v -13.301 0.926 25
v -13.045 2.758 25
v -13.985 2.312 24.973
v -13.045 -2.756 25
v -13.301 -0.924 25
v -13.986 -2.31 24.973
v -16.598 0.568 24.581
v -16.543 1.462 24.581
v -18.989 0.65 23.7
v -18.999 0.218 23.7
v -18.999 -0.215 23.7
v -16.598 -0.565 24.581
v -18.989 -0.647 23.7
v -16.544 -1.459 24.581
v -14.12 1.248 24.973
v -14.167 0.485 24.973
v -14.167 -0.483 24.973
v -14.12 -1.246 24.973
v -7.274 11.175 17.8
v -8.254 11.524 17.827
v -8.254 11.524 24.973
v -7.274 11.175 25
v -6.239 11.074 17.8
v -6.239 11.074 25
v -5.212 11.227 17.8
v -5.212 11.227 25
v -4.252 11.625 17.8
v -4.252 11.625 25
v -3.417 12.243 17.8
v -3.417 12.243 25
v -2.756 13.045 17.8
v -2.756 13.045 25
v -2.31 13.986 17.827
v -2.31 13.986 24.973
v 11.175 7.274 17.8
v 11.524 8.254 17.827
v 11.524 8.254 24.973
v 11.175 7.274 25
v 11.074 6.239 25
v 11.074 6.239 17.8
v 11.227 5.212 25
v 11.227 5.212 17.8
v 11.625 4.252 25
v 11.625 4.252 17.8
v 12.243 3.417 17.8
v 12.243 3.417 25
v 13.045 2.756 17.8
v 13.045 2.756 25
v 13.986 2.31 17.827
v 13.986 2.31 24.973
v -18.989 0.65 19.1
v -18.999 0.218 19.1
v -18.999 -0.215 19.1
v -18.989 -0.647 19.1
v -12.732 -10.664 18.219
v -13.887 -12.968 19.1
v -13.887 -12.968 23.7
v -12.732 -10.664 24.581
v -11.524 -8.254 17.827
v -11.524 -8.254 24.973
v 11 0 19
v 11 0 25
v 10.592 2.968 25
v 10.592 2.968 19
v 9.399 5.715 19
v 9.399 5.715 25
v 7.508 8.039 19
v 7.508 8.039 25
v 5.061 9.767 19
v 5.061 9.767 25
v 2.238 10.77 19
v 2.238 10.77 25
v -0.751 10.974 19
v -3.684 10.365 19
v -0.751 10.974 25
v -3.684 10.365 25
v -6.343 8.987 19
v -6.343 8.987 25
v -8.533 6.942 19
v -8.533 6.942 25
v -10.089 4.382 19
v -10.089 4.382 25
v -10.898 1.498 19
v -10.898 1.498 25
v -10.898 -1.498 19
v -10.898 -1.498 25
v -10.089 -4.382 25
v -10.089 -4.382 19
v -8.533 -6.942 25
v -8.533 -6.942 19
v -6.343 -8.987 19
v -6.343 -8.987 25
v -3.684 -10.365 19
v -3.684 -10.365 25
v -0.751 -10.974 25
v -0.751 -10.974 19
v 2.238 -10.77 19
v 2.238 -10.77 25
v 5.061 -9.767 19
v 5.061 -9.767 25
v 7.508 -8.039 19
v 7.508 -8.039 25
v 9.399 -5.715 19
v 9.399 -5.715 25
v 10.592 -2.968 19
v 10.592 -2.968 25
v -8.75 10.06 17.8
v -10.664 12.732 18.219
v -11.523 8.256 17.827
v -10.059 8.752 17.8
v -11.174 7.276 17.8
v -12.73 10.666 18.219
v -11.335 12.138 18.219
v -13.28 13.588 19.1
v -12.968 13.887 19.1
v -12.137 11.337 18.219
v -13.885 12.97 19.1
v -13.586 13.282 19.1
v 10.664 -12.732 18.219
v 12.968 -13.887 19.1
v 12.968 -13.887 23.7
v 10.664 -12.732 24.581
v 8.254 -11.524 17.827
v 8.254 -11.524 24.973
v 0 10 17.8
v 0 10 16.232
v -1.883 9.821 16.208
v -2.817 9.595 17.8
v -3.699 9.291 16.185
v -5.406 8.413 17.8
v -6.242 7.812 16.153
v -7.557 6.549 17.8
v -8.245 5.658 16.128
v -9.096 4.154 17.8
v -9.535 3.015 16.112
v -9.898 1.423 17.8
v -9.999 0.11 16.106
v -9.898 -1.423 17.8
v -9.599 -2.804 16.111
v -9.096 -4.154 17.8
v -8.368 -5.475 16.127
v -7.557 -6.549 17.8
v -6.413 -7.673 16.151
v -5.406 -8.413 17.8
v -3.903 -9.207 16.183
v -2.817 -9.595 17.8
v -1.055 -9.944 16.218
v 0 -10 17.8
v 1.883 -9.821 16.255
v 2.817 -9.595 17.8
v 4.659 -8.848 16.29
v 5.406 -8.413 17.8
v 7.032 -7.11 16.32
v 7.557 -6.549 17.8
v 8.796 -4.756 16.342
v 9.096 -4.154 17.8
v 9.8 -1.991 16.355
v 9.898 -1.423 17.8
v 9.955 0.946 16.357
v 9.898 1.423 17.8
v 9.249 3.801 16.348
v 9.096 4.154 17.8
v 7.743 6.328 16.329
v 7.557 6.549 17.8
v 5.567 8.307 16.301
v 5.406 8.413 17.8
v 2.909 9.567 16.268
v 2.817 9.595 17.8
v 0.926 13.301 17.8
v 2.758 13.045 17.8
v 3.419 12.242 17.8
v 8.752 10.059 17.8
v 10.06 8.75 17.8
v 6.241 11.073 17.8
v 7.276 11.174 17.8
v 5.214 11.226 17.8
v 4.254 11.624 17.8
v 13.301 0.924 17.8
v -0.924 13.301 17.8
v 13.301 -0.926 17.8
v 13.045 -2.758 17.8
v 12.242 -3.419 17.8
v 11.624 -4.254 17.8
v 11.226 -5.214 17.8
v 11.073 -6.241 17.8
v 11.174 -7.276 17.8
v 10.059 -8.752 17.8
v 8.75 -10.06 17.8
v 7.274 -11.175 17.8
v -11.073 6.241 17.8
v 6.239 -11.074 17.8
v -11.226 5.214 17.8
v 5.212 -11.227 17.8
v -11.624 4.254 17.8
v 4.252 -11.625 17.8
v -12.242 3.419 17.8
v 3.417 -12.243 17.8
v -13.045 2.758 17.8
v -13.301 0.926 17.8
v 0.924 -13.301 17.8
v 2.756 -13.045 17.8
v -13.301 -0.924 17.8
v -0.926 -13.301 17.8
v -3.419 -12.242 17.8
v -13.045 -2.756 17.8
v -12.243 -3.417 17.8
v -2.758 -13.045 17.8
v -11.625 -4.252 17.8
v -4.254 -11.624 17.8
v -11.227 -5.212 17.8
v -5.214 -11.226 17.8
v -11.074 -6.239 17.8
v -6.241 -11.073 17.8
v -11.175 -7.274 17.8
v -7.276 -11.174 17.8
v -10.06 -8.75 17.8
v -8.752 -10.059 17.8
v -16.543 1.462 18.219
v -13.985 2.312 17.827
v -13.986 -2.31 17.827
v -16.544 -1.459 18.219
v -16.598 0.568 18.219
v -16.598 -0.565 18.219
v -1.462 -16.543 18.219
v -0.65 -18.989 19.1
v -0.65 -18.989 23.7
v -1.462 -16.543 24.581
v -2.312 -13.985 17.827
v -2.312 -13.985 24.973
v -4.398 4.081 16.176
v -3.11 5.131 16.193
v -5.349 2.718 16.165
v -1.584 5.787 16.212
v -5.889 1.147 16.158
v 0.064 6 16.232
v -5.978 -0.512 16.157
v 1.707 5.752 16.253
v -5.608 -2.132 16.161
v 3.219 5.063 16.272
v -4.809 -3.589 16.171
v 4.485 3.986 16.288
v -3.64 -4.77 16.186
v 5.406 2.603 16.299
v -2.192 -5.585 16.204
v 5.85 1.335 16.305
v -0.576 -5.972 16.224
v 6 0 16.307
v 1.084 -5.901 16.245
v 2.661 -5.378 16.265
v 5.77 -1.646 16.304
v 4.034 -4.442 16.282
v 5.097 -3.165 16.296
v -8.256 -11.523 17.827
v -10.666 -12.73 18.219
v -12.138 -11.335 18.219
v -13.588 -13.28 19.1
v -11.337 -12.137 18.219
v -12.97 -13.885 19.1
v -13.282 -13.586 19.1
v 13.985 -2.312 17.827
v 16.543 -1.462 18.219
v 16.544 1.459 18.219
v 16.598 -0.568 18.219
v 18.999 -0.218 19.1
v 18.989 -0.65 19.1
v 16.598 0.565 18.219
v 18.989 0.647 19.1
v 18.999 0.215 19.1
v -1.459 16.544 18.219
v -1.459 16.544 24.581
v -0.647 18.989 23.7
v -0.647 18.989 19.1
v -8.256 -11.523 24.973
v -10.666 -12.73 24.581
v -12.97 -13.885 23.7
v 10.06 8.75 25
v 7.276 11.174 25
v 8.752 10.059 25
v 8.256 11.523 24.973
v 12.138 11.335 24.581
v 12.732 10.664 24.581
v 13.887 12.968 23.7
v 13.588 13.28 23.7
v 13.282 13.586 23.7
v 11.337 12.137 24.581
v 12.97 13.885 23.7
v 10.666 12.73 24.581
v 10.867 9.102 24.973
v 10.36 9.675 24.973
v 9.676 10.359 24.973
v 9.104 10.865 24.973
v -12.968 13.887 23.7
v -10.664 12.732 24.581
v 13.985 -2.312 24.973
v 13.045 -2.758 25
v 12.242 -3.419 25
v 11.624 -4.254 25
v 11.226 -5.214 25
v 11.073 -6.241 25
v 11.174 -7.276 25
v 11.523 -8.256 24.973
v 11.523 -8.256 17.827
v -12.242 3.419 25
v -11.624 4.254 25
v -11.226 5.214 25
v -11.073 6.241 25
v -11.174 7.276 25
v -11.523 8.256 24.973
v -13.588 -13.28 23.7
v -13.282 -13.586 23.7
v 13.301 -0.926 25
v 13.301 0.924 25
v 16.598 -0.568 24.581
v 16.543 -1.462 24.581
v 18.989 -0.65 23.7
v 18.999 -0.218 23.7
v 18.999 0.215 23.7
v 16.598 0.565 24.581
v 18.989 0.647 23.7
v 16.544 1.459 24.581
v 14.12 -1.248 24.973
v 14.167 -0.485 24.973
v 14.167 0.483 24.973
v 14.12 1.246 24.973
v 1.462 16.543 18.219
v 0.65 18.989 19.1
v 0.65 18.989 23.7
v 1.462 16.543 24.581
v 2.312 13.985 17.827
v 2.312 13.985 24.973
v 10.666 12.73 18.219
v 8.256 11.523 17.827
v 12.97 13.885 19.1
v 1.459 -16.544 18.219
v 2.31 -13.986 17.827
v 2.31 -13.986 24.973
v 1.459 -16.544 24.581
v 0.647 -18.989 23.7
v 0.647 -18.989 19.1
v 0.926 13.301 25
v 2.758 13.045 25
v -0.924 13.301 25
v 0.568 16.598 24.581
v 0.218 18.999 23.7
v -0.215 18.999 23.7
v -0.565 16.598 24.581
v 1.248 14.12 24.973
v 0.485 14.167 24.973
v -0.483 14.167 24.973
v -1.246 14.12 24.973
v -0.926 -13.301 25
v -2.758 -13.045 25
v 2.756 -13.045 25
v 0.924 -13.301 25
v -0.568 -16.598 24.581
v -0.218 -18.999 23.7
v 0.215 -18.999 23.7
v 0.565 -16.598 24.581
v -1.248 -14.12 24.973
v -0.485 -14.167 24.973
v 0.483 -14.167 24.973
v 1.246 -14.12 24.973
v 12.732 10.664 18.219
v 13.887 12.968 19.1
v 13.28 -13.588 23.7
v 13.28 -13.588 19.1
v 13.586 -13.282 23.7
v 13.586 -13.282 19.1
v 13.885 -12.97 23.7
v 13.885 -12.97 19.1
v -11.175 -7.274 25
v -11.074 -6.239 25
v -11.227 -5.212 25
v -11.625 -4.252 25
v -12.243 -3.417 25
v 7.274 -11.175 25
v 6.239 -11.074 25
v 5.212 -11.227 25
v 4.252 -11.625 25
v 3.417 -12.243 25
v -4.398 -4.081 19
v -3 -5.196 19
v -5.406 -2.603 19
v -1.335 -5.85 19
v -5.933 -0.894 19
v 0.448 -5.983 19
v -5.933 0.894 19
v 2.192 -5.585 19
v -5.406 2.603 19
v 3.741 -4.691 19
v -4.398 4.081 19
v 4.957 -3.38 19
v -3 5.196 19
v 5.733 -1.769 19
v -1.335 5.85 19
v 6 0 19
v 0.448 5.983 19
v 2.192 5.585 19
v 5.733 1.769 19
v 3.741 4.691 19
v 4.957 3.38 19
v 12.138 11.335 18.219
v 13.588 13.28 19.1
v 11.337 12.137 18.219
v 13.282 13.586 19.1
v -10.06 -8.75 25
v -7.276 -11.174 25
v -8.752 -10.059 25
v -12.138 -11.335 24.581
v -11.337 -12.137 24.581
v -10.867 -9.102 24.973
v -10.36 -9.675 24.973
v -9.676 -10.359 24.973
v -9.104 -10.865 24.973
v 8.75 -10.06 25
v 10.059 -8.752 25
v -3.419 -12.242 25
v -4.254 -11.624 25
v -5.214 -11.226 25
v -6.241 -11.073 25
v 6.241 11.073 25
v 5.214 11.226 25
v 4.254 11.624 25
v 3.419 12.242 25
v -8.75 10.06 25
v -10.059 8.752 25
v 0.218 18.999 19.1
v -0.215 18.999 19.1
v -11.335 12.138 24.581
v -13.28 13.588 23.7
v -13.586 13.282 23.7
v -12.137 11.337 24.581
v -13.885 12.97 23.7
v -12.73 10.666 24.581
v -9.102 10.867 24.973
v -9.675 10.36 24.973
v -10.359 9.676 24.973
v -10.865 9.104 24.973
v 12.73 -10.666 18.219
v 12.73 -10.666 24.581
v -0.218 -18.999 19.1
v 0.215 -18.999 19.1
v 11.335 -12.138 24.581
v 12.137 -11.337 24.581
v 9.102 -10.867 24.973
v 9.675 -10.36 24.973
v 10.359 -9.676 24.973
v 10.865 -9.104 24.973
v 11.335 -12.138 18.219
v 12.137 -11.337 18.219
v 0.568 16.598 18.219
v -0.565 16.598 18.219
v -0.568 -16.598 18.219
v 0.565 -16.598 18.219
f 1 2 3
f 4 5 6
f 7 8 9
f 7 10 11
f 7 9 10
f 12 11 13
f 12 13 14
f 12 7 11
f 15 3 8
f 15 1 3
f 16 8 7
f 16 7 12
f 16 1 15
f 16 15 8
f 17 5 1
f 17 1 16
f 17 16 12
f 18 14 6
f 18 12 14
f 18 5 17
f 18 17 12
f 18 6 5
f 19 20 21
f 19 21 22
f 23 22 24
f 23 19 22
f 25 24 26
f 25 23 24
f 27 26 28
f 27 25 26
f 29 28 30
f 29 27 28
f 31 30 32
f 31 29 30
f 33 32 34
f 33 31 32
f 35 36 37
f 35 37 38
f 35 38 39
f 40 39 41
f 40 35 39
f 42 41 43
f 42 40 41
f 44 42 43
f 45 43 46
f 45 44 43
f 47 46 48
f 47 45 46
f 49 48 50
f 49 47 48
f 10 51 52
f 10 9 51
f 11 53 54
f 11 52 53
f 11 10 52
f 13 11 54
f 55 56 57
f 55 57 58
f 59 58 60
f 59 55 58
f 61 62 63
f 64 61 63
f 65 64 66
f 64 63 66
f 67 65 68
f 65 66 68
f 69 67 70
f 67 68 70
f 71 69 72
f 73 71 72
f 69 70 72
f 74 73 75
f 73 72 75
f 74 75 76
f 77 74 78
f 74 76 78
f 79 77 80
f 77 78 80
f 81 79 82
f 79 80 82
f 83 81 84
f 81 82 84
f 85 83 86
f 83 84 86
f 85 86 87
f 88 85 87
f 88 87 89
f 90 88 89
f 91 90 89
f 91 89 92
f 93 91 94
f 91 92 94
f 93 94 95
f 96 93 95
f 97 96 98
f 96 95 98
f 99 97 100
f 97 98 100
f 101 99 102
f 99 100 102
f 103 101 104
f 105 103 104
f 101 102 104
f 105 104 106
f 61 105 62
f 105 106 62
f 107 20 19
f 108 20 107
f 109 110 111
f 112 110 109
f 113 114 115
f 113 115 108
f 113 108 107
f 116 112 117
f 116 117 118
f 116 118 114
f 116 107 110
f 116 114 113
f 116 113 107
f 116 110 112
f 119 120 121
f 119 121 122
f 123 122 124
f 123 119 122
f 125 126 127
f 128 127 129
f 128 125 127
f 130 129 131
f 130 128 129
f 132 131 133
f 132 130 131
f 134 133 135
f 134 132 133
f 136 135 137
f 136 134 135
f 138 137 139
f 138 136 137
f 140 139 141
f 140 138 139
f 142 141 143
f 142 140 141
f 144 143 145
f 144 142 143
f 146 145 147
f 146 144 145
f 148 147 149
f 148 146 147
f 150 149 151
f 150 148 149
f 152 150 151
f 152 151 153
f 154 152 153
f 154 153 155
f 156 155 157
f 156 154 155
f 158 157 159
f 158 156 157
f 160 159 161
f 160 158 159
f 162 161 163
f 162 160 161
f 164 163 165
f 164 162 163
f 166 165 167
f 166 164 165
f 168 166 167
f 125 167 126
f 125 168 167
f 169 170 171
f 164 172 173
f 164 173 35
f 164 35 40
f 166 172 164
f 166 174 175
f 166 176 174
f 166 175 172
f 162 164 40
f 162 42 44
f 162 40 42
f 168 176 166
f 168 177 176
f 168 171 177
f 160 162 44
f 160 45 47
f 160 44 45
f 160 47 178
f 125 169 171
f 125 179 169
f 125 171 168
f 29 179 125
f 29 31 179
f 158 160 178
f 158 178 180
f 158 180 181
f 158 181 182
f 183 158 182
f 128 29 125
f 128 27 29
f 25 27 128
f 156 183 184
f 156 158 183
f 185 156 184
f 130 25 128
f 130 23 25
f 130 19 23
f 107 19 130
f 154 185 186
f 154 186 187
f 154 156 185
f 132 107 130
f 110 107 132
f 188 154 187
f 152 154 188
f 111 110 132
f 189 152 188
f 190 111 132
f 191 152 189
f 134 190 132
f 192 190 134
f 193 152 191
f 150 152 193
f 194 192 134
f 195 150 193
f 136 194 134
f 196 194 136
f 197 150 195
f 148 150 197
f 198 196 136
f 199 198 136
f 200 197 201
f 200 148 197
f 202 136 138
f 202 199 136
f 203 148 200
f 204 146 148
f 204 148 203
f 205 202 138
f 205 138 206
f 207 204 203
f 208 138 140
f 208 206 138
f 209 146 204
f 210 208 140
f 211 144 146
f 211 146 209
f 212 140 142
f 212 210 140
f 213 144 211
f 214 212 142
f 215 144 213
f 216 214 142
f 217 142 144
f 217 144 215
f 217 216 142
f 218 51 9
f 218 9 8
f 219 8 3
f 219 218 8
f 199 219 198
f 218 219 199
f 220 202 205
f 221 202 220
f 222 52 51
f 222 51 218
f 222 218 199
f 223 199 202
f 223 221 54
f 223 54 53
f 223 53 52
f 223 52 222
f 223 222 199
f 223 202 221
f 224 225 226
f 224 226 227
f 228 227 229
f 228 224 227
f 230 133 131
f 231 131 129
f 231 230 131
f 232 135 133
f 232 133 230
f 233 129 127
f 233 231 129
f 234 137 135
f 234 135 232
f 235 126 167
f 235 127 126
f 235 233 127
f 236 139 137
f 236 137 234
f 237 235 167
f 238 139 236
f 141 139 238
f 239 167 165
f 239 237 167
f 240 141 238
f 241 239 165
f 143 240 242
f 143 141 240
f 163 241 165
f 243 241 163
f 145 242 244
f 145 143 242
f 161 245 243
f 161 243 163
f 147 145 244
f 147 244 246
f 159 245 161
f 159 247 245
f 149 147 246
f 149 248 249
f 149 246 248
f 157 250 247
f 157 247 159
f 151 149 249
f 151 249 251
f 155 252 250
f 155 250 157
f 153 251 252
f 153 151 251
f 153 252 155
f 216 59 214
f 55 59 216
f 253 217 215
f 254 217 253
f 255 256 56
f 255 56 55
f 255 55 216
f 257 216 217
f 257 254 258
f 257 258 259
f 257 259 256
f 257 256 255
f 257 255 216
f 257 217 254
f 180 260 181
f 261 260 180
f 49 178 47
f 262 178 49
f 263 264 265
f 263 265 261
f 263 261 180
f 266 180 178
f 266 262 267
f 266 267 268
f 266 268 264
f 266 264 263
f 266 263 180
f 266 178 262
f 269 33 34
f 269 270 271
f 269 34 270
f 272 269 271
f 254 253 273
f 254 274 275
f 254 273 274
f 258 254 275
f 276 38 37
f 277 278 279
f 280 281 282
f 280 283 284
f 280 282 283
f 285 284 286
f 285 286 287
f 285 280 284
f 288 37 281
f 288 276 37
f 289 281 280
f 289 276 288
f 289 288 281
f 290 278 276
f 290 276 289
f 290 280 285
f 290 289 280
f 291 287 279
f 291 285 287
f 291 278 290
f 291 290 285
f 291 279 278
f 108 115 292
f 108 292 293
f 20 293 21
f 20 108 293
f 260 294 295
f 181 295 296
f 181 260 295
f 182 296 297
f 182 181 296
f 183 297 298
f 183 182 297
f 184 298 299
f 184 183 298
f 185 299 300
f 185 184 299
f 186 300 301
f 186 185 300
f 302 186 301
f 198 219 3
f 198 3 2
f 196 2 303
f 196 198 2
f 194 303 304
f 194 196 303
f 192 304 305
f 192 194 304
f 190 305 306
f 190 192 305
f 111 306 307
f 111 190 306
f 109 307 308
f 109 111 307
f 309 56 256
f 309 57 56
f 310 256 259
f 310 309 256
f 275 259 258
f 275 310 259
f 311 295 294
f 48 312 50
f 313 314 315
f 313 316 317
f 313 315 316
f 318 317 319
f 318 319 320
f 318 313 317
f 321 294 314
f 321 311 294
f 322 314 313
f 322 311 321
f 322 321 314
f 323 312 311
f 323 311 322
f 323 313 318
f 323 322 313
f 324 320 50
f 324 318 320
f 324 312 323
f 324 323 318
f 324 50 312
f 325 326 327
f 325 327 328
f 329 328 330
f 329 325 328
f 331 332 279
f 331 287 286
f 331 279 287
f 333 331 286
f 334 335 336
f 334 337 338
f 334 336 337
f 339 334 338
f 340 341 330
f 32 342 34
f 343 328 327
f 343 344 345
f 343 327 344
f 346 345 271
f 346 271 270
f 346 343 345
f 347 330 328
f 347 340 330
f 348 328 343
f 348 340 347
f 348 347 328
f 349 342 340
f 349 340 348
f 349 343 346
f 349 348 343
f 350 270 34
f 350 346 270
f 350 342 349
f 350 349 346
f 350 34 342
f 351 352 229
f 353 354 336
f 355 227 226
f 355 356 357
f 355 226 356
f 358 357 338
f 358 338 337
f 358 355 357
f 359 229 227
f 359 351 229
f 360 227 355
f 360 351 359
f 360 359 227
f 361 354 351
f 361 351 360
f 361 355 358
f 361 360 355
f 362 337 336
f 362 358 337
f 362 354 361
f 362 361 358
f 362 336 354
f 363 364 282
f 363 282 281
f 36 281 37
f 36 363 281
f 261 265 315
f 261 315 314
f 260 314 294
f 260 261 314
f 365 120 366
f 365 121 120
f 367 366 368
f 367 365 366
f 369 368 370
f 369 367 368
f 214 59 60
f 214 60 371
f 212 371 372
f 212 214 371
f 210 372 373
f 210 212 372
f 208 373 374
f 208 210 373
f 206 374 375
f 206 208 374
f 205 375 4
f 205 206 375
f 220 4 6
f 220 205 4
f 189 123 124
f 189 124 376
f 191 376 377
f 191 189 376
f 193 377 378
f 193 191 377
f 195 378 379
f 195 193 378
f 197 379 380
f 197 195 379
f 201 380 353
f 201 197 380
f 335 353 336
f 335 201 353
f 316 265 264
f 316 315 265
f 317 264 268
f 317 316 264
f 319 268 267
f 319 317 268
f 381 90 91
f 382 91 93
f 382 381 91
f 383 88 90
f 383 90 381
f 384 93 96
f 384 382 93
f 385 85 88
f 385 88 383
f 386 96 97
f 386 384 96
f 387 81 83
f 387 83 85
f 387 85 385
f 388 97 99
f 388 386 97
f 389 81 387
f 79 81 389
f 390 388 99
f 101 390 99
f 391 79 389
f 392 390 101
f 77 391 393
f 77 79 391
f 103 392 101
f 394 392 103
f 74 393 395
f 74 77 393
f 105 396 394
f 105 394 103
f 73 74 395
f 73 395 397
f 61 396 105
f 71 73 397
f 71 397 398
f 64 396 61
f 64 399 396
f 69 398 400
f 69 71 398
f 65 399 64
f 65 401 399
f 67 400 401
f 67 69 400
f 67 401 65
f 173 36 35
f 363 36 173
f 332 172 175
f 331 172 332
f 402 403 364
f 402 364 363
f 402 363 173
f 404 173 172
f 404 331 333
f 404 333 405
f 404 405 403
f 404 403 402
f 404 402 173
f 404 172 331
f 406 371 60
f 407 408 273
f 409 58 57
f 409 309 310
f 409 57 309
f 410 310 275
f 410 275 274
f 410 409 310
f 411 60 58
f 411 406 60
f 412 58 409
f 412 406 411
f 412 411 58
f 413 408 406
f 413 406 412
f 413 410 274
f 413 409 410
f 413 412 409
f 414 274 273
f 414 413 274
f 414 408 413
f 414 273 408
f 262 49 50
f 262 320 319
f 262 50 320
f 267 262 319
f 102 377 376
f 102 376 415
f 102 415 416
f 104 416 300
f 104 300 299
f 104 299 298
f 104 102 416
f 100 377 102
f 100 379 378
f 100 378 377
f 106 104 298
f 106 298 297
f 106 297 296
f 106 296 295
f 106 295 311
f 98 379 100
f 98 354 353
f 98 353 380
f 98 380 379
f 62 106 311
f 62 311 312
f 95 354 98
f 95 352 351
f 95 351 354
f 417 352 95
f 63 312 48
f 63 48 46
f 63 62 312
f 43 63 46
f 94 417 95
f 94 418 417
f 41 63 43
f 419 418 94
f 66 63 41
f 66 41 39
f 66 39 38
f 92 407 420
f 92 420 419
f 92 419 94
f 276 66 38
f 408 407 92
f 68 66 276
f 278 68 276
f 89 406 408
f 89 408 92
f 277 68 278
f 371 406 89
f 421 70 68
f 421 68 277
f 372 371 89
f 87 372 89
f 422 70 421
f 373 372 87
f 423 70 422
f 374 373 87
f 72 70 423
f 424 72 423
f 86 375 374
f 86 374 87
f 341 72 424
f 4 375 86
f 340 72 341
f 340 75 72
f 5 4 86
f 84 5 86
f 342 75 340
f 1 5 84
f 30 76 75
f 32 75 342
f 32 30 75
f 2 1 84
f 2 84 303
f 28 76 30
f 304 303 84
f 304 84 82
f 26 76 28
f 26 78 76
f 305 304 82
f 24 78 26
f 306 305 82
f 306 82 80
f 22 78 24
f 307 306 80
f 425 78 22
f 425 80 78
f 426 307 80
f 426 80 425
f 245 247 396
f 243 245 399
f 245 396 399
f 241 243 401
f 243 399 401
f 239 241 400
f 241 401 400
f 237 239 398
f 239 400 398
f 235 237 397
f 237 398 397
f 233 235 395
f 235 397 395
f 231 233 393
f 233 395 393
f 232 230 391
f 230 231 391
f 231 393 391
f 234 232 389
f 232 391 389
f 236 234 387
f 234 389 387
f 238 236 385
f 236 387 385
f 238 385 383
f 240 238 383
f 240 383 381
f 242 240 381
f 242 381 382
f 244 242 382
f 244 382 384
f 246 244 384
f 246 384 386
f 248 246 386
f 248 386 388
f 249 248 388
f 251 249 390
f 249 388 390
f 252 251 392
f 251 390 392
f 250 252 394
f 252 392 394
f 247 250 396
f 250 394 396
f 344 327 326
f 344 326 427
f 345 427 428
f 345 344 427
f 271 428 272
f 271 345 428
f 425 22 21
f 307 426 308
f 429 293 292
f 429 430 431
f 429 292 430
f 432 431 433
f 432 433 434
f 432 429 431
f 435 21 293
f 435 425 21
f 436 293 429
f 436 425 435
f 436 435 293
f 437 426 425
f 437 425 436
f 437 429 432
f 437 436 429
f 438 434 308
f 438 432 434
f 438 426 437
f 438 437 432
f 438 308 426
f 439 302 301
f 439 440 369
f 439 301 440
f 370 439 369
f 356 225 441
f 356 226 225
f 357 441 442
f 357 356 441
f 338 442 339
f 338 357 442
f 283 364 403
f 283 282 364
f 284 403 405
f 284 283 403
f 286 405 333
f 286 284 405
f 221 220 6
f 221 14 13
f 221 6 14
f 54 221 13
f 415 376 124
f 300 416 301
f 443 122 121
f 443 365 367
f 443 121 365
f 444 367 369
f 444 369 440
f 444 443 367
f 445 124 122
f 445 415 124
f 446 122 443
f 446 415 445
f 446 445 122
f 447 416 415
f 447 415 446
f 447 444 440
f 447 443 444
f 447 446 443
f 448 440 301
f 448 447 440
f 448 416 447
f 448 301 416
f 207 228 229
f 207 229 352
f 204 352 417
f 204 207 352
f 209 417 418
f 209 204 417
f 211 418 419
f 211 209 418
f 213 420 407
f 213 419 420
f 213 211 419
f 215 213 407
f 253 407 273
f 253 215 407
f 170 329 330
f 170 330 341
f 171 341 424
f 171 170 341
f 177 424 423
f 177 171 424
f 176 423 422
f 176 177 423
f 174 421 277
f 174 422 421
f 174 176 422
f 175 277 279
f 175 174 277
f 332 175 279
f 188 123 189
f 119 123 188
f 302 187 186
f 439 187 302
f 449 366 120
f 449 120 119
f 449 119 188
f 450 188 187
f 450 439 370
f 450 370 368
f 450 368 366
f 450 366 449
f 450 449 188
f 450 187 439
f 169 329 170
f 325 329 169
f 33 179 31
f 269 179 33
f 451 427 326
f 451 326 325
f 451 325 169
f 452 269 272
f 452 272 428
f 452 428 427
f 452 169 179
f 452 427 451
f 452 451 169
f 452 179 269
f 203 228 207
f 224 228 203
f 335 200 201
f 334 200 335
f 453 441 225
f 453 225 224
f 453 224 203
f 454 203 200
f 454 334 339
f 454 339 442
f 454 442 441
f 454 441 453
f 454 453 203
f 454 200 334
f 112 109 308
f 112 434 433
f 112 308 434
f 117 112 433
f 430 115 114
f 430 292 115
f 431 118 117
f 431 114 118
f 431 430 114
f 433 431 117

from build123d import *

# Parameters (mm, degrees)
CUT_EXTRUDE_1_DEPTH      = 37.701498607
PATTERN_CIRCULAR_1_COUNT = 8
SKETCH_14_R              = 6
CUT_EXTRUDE_5_DEPTH      = 28
SKETCH_15_R              = 11
CUT_EXTRUDE_6_DEPTH      = 6
CUT_EXTRUDE_7_DEPTH      = 37.701498779
CUT_EXTRUDE_7_DEPTH_BACK = 37.701498779


with BuildPart() as part:
    # 草图4 → 旋转1 (revolve)
    with BuildSketch(Plane(origin=(0, 0, 0), x_dir=(0, 0, -1), z_dir=(1, 0, 0))):
        with BuildLine():
            Line((0, 10), (-17.8, 10))
            Line((-17.8, 10), (-17.8, 13.333431373))
            ThreePointArc((-17.8, 13.333431373), (-18.129167352, 16.240319744), (-19.1, 19))
            Line((-19.1, 19), (-23.7, 19))
            ThreePointArc((-23.7, 19), (-24.670832648, 16.240319744), (-25, 13.333431373))
            Line((-25, 13.333431373), (-25, 5))
            Line((-25, 5), (0, 5))
            Line((0, 5), (0, 10))
        make_face()
    revolve(axis=Axis((0, 0, 0), (0, 0, 1)))

    # 草图5 → 切除-拉伸1 (cut, through all)
    with BuildSketch(Plane.XY):
        with BuildLine():
            Line((0.65, 18.988878324), (2.31192381, 13.985375154))
            ThreePointArc((2.31192381, 13.985375154), (4.721353225, 11.395659205), (8.256304086, 11.522549751))
            Line((8.256304086, 11.522549751), (12.969867869, 13.884614776))
            ThreePointArc((12.969867869, 13.884614776), (7.272453285, 17.553102951), (0.65, 18.988878324))
        make_face()
    cut_extrude_1 = extrude(amount=CUT_EXTRUDE_1_DEPTH, mode=Mode.SUBTRACT)

    # 阵列(圆周)1: 切除-拉伸1 ×8 about axis
    pattern_circular_1_axis = Axis((0, 0, 0), (0, 0, 1))
    for i in range(1, PATTERN_CIRCULAR_1_COUNT):
        add(cut_extrude_1.rotate(pattern_circular_1_axis, i * 360 / PATTERN_CIRCULAR_1_COUNT), mode=Mode.SUBTRACT)

    # 草图14 → 切除-拉伸5 (cut)
    with BuildSketch(Plane.XY.offset(25)):
        Circle(SKETCH_14_R)
    extrude(amount=-CUT_EXTRUDE_5_DEPTH, mode=Mode.SUBTRACT)

    # 草图15 → 切除-拉伸6 (cut)
    with BuildSketch(Plane.XY.offset(25)):
        Circle(SKETCH_15_R)
    extrude(amount=-CUT_EXTRUDE_6_DEPTH, mode=Mode.SUBTRACT)

    # 草图16 → 切除-拉伸7 (cut, two sides: drawn at the far end of the back side and taken through both)
    with BuildSketch(Plane(origin=(0, 0, 0), x_dir=(1, 0, 0), z_dir=(0, 1, 0)).offset(-CUT_EXTRUDE_7_DEPTH_BACK)):
        Polygon((-109.354391609, -14.859816975), (-15.287230377, -16.039870969), (19.672911223, -16.478439053), (113.740072455, -17.658493047), (116.100180443, 170.475829416), (-106.994283621, 173.274505489), align=None)
    extrude(amount=CUT_EXTRUDE_7_DEPTH + CUT_EXTRUDE_7_DEPTH_BACK, mode=Mode.SUBTRACT)


solid = part.part
